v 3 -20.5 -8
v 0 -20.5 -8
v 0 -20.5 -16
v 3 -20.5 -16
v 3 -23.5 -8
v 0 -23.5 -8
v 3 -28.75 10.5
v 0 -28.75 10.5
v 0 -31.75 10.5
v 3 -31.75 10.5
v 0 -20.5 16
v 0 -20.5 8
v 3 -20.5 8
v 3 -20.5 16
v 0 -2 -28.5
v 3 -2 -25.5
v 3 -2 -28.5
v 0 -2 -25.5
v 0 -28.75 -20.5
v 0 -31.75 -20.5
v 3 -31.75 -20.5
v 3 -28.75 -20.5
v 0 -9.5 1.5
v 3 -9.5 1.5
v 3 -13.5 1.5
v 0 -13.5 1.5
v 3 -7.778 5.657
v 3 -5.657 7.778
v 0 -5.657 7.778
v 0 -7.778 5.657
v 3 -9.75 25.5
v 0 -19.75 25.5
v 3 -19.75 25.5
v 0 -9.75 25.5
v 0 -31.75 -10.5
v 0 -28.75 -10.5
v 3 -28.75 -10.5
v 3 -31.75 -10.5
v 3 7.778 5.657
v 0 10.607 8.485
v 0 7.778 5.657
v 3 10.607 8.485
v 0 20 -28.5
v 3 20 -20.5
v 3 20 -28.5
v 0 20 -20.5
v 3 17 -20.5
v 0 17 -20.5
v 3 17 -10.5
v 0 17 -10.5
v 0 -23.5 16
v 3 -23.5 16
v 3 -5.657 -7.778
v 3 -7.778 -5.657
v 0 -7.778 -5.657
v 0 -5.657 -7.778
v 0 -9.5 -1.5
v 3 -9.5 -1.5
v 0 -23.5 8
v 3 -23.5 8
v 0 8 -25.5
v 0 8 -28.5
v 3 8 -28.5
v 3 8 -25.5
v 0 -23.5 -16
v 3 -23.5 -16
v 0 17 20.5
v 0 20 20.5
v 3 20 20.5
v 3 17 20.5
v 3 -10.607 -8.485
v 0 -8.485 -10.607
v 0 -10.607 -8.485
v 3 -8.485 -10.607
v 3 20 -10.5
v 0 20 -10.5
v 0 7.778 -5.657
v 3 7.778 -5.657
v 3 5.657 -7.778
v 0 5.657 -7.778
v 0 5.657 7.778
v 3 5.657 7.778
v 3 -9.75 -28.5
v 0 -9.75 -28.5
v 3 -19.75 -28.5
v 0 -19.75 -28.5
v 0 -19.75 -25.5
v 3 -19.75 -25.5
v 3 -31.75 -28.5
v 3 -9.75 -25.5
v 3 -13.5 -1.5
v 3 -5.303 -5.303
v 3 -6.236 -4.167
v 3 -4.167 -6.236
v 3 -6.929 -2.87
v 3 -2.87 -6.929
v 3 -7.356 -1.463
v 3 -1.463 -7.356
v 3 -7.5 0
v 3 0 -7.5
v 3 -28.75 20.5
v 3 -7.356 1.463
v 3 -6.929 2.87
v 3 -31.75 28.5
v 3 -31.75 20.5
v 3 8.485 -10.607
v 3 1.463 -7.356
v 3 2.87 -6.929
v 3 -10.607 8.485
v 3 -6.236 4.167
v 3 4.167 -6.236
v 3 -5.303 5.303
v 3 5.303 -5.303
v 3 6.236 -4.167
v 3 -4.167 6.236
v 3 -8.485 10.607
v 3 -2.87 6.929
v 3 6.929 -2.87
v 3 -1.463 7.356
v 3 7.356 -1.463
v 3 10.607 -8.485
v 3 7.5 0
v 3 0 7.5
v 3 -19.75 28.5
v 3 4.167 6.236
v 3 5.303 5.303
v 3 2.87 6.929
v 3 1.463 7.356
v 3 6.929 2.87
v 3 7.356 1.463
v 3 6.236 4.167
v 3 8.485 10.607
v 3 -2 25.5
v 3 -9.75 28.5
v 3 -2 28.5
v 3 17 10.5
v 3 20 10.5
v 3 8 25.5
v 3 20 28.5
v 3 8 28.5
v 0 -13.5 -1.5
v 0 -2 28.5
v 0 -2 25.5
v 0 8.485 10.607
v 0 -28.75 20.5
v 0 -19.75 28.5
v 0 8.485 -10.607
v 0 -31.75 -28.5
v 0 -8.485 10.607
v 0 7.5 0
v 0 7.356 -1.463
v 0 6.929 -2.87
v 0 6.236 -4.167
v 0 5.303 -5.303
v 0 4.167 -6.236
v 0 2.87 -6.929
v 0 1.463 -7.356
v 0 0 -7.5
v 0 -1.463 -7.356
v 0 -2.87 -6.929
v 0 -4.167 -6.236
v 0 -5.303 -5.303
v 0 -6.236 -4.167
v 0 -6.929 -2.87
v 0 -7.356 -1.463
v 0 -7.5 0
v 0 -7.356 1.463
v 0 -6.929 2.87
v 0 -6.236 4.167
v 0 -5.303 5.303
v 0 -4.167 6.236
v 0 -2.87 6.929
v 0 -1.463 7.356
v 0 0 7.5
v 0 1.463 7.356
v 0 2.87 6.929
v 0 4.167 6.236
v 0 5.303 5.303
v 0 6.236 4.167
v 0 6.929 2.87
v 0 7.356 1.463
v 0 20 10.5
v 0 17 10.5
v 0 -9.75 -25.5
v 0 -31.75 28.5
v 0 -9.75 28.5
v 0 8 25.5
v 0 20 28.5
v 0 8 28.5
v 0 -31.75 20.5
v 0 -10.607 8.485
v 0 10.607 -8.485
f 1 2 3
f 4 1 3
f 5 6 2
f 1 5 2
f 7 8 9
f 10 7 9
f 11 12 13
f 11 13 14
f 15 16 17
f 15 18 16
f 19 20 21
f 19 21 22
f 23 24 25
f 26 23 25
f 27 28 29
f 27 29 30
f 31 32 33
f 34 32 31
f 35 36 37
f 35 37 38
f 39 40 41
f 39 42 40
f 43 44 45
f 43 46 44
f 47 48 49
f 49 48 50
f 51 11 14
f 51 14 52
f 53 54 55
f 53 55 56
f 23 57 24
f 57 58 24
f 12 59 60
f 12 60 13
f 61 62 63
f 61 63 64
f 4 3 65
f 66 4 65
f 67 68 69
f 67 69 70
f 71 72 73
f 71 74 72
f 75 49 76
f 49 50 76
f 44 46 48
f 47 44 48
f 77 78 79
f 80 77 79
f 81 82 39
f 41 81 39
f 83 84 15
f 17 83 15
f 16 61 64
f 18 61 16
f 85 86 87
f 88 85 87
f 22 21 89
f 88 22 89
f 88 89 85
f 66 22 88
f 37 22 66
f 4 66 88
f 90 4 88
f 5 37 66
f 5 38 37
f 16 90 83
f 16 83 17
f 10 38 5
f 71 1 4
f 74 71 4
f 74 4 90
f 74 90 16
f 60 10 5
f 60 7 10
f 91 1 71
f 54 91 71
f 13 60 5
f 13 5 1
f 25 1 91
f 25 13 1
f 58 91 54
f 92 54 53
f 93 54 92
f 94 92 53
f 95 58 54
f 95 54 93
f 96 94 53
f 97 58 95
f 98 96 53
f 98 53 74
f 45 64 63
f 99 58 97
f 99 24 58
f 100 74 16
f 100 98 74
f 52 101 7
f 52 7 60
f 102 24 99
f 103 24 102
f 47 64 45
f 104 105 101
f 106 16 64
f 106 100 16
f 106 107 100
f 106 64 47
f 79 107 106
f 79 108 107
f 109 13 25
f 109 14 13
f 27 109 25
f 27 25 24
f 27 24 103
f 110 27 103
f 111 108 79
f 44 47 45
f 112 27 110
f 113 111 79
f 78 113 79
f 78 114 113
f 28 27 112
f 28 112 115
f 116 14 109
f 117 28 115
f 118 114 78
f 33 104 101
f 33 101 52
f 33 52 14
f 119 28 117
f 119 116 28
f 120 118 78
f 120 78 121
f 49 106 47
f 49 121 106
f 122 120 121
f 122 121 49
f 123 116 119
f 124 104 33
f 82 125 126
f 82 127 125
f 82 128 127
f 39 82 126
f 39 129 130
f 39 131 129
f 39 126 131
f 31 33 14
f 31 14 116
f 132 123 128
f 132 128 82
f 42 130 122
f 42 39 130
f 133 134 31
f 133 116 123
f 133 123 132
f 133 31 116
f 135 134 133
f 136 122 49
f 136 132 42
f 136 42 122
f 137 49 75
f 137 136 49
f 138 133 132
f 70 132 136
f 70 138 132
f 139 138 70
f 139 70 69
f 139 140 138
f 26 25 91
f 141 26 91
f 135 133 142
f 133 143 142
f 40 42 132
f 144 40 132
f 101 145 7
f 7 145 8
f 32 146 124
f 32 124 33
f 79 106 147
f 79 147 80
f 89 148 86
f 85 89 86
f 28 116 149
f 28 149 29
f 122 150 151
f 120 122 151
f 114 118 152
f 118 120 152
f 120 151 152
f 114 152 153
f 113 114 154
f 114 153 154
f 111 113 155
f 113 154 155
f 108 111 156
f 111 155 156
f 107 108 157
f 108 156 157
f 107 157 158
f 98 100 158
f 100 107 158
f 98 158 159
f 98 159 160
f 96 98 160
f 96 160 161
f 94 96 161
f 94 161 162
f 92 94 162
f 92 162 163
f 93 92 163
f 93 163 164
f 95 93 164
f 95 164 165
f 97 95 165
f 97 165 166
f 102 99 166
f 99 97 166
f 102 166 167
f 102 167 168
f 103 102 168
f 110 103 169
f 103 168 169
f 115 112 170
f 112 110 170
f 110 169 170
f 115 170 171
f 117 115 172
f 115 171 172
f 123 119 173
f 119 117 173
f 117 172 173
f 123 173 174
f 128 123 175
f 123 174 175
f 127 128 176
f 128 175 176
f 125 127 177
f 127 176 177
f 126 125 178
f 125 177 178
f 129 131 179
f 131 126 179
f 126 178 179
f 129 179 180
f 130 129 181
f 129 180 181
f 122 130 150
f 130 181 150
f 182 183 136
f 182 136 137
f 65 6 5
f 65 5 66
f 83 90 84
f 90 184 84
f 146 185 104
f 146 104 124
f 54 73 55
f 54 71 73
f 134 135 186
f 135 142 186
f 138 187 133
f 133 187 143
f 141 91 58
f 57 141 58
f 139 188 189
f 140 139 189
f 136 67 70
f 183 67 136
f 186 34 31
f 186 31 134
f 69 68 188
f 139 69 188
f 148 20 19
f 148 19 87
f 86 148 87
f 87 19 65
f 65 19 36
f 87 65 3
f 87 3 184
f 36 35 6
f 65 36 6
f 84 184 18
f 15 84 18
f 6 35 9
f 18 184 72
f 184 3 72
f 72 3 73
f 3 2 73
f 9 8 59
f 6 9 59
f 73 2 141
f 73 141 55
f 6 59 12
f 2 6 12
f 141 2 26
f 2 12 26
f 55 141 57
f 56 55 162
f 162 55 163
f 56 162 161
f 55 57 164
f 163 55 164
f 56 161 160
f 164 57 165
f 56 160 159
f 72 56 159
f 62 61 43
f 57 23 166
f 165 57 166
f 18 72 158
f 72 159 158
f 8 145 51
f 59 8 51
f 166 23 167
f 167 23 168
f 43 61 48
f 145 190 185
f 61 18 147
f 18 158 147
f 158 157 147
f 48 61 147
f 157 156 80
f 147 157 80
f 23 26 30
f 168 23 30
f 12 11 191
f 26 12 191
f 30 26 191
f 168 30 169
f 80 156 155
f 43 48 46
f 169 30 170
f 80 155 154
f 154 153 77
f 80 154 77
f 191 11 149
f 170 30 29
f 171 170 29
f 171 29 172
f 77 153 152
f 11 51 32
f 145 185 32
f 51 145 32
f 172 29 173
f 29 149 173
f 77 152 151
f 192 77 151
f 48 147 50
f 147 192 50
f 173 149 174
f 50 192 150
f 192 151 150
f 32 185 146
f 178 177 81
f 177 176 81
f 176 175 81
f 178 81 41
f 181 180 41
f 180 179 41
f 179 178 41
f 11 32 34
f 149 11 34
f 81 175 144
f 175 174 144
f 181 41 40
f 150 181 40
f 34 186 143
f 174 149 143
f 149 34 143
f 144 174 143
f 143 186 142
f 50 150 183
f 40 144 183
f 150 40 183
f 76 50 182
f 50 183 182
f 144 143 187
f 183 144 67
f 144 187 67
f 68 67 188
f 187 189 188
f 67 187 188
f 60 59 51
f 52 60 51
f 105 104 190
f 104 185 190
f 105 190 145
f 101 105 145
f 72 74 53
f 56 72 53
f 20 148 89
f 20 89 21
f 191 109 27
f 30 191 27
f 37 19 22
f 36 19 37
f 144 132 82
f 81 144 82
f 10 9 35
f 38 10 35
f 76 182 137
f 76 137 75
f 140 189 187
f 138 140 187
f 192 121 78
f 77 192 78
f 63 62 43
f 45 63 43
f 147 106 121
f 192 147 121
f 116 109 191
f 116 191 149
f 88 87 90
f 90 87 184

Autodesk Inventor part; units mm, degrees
ref_plane "YZ Plane" through (0, 0, 0) normal (1, 0, 0) x (0, 1, 0)
ref_plane "XZ Plane" through (0, 0, 0) normal (0, 1, 0) x (-1, 0, 0)
ref_plane "XY Plane" through (0, 0, 0) normal (0, 0, 1) x (1, 0, 0)
sketch "Sketch1" plane through (0, 0, 0) normal (1, 0, 0) x (0, 1, 0)
  circle A0 centre (0, 0) radius 7.5
  line L0 (-31.75, -25.5) -> (-31.75, -20.5)
  line L1 (-31.75, -20.5) -> (-28.75, -20.5)
  line L2 (-28.75, -20.5) -> (-28.75, -10.5)
  line L3 (-28.75, -10.5) -> (-31.75, -10.5)
  line L4 (0, 0) -> (-31.75, 0) construction
  line L5 (-31.75, 20.5) -> (-28.75, 20.5)
  line L6 (-28.75, 20.5) -> (-28.75, 10.5)
  line L7 (-28.75, 10.5) -> (-31.75, 10.5)
  line L8 (-31.75, 25.5) -> (-31.75, 20.5)
  line L9 (-31.75, 10.5) -> (-31.75, -10.5)
  line L10 (-31.75, -20.5) -> (-31.75, -25.5)
  line L11 (20, 25.5) -> (20, 20.5)
  line L12 (20, 20.5) -> (17, 20.5)
  line L13 (17, 20.5) -> (17, 10.5)
  line L14 (17, 10.5) -> (20, 10.5)
  line L15 (20, -20.5) -> (17, -20.5)
  line L16 (17, -20.5) -> (17, -10.5)
  line L17 (17, -10.5) -> (20, -10.5)
  line L18 (20, 25.5) -> (20, 20.5)
  line L19 (20, 10.5) -> (20, -10.5)
  line L20 (20, -20.5) -> (20, -25.5)
  line L21 (20, 25.5) -> (20, 28.5)
  line L22 (-31.75, 28.5) -> (-31.75, 25.5)
  line L23 (-31.75, -25.5) -> (-31.75, -28.5)
  line L24 (20, -28.5) -> (20, -25.5)
  line L25 (-31.75, 28.5) -> (-19.75, 28.5)
  line L26 (-19.75, 28.5) -> (-19.75, 25.5)
  line L27 (-19.75, 25.5) -> (-9.75, 25.5)
  line L28 (-9.75, 25.5) -> (-9.75, 28.5)
  line L29 (-5.875, -28.5) -> (-5.875, 0) construction
  line L30 (8, 28.5) -> (8, 25.5)
  line L31 (8, 25.5) -> (-2, 25.5)
  line L32 (-2, 25.5) -> (-2, 28.5)
  line L33 (-19.75, -28.5) -> (-19.75, -25.5)
  line L34 (-19.75, -25.5) -> (-9.75, -25.5)
  line L35 (-9.75, -25.5) -> (-9.75, -28.5)
  line L36 (8, -25.5) -> (-2, -25.5)
  line L37 (8, -28.5) -> (8, -25.5)
  line L38 (-2, -25.5) -> (-2, -28.5)
  line L39 (-19.75, 28.5) -> (-31.75, 28.5)
  line L40 (20, 28.5) -> (8, 28.5)
  line L41 (-2, 28.5) -> (-9.75, 28.5)
  line L42 (-31.75, -28.5) -> (-19.75, -28.5)
  line L43 (-9.75, -28.5) -> (-2, -28.5)
  line L44 (8, -28.5) -> (20, -28.5)
  line L45 (-31.75, -28.5) -> (-19.75, -28.5)
  line L46 (-9.75, -28.5) -> (-5.875, -28.5)
  line L47 (-28.75, 20.5) -> (-23.5, 20.5) construction
  line L48 (-23.5, 20.5) -> (-23.5, -28.5) construction
  line L49 (-23.5, 0) -> (-23.5, -8) construction
  line L50 (-23.5, -8) -> (-20.5, -8)
  line L51 (-20.5, -8) -> (-20.5, -16)
  line L52 (-20.5, -16) -> (-23.5, -16)
  line L53 (-23.5, -8) -> (-23.5, -16)
  line L54 (-23.5, -20.5) -> (-23.5, 28.5) construction
  line L55 (-23.5, 0) -> (-23.5, 8) construction
  line L56 (-23.5, 8) -> (-20.5, 8)
  line L57 (-20.5, 8) -> (-20.5, 16)
  line L58 (-20.5, 16) -> (-23.5, 16)
  line L59 (-23.5, 8) -> (-23.5, 16)
  line L60 (0, -7.5) -> (0, -9.5) construction
  line L61 (0, -9.5) -> (1.5, -9.5)
  line L62 (1.5, -9.5) -> (1.5, -13.5)
  line L63 (1.5, -13.5) -> (-1.5, -13.5)
  line L64 (-1.5, -13.5) -> (-1.5, -9.5)
  line L65 (-1.5, -9.5) -> (0, -9.5)
  line L66 (0, 9.5) -> (1.5, 9.5)
  line L67 (1.5, 9.5) -> (1.5, 13.5)
  line L68 (1.5, 13.5) -> (-1.5, 13.5)
  line L69 (-1.5, 13.5) -> (-1.5, 9.5)
  line L70 (-1.5, 9.5) -> (0, 9.5)
  line L71 (7.5, 0) -> (9.5, 0) construction
  line L72 (9.5, 0) -> (9.5, -1.5)
  line L73 (9.5, -1.5) -> (13.5, -1.5)
  line L74 (13.5, -1.5) -> (13.5, 1.5)
  line L75 (13.5, 1.5) -> (9.5, 1.5)
  line L76 (9.5, 1.5) -> (9.5, 0)
  line L77 (-7.5, 0) -> (-9.5, 0) construction
  line L78 (-9.5, 0) -> (-9.5, -1.5)
  line L79 (-9.5, -1.5) -> (-13.5, -1.5)
  line L80 (-13.5, -1.5) -> (-13.5, 1.5)
  line L81 (-13.5, 1.5) -> (-9.5, 1.5)
  line L82 (-9.5, 1.5) -> (-9.5, 0)
  dimension "d0" = 15
  dimension "d3" = 51
  dimension "d7" = 5
  dimension "d8" = 3
  dimension "d9" = 10
  dimension "d10" = 3
  dimension "d11" = 51.75
  dimension "d12" = 3
  dimension "d13" = 3
  dimension "d14" = 12
  dimension "d15" = 3
  dimension "d16" = 10
  dimension "d17" = 25.875
  dimension "d18" = 5.25
  dimension "d19" = 8
  dimension "d20" = 3
  dimension "d21" = 8
  dimension "d22" = 2
  dimension "d23" = 1.5
  dimension "d24" = 4
  dimension "d25" = 3
  dimension "d26" = 2
  dimension "d27" = 1.5
  dimension "d28" = 4
  dimension "d29" = 3
extrude "Extrusion1" add sketch "Sketch1" along normal blind 3
sketch "Sketch4" plane through (3, 0, 0) normal (1, 0, 0) x (0, 0, -1)
  line L0 (1.5, 9.5) -> (-1.5, 9.5) projected
  line L1 (-1.5, 9.5) -> (1.5, 9.5)
  line L2 (1.5, 13.5) -> (1.5, 9.5) projected
  line L3 (1.5, 9.5) -> (1.5, 13.5)
  line L4 (-1.5, 13.5) -> (1.5, 13.5) projected
  line L5 (1.5, 13.5) -> (-1.5, 13.5)
  line L6 (-1.5, 9.5) -> (-1.5, 13.5) projected
  line L7 (-1.5, 13.5) -> (-1.5, 9.5)
  line L8 (-1.5, -9.5) -> (1.5, -9.5) projected
  line L9 (-1.5, -9.5) -> (1.5, -9.5)
  line L10 (1.5, -9.5) -> (1.5, -13.5) projected
  line L11 (1.5, -9.5) -> (1.5, -13.5)
  line L12 (1.5, -13.5) -> (-1.5, -13.5) projected
  line L13 (1.5, -13.5) -> (-1.5, -13.5)
  line L14 (-1.5, -13.5) -> (-1.5, -9.5) projected
  line L15 (-1.5, -13.5) -> (-1.5, -9.5)
  point P0 (0, 0)
extrude "Extrusion3" add sketch "Sketch4" against normal up to surface (3 mm away)
sketch "Sketch5" plane through (3, 0, 0) normal (1, 0, 0) x (0, 0, -1)
  line L0 (-9.5, -1.5) -> (-13.5, -1.5) projected
  line L1 (-13.5, -1.5) -> (-13.5, 1.5) projected
  line L2 (-13.5, 1.5) -> (-9.5, 1.5) projected
  line L3 (-9.5, 1.5) -> (-9.5, -1.5) projected
  line L4 (-9.5, -1.5) -> (-13.5, -1.5) projected
  line L5 (-13.5, -1.5) -> (-13.5, 1.5) projected
  line L6 (-13.5, -1.5) -> (-13.5, 1.5)
  line L7 (-13.5, 1.5) -> (-9.5, 1.5) projected
  line L8 (-13.5, 1.5) -> (-9.5, 1.5)
  line L9 (-9.5, 1.5) -> (-9.5, -1.5)
  line L10 (-13.5, -1.5) -> (-9.5, -1.5)
  line L11 (0, 0) -> (0, 8.8912) construction
  line L12 (-8.4853, -10.6066) -> (-10.6066, -8.4853)
  line L13 (-10.6066, -8.4853) -> (-7.7782, -5.6569)
  line L14 (-7.7782, -5.6569) -> (-5.6569, -7.7782)
  line L15 (-8.4853, -10.6066) -> (-5.6569, -7.7782)
  line L16 (8.4853, -10.6066) -> (5.6569, -7.7782)
  line L17 (10.6066, -8.4853) -> (8.4853, -10.6066)
  line L18 (10.6066, -8.4853) -> (7.7782, -5.6569)
  line L19 (5.6569, -7.7782) -> (7.7782, -5.6569)
  line L20 (0, 0) -> (-7.7782, 0) construction
  line L21 (-10.6066, 8.4853) -> (-7.7782, 5.6569)
  line L22 (-8.4853, 10.6066) -> (-10.6066, 8.4853)
  line L23 (-8.4853, 10.6066) -> (-5.6569, 7.7782)
  line L24 (-7.7782, 5.6569) -> (-5.6569, 7.7782)
  line L25 (10.6066, 8.4853) -> (7.7782, 5.6569)
  line L26 (5.6569, 7.7782) -> (7.7782, 5.6569)
  line L27 (8.4853, 10.6066) -> (5.6569, 7.7782)
  line L28 (10.6066, 8.4853) -> (8.4853, 10.6066)
extrude "Extrusion4" cut sketch "Sketch5" against normal up to surface (3 mm away) contours L12 L13 L14 L15 | L16 L19 L18 L17 | L22 L23 L24 L21 | L25 L26 L27 L28
ref_plane "Work Plane1" through (-17.5, 0, 0) normal (1, 0, 0) x (0, 0, -1)
sketch "Sketch6" plane through (-17.5, 0, 0) normal (1, 0, 0) x (0, 0, -1)
  line L0 (8.4853, -10.6066) -> (5.6569, -7.7782) projected
  line L1 (5.6569, -7.7782) -> (7.7782, -5.6569) projected
  line L2 (7.7782, -5.6569) -> (10.6066, -8.4853) projected
  line L3 (10.6066, -8.4853) -> (8.4853, -10.6066) projected
  line L4 (-5.6569, 7.7782) -> (-7.7782, 5.6569) projected
  line L5 (-7.7782, 5.6569) -> (-10.6066, 8.4853) projected
  line L6 (-10.6066, 8.4853) -> (-8.4853, 10.6066) projected
  line L7 (-8.4853, 10.6066) -> (-5.6569, 7.7782) projected
  line L8 (10.6066, 8.4853) -> (7.7782, 5.6569) projected
  line L9 (7.7782, 5.6569) -> (5.6569, 7.7782) projected
  line L10 (5.6569, 7.7782) -> (8.4853, 10.6066) projected
  line L11 (8.4853, 10.6066) -> (10.6066, 8.4853) projected
  line L12 (-7.7782, -5.6569) -> (-5.6569, -7.7782) projected
  line L13 (-5.6569, -7.7782) -> (-8.4853, -10.6066) projected
  line L14 (-8.4853, -10.6066) -> (-10.6066, -8.4853) projected
  line L15 (-10.6066, -8.4853) -> (-7.7782, -5.6569) projected
  line L16 (-25.5, -2) -> (-28.5, -2) projected
  line L17 (-28.5, -2) -> (-28.5, -9.75) projected
  line L18 (-28.5, -9.75) -> (-25.5, -9.75) projected
  line L19 (-25.5, -9.75) -> (-25.5, -19.75) projected
  line L20 (-25.5, -19.75) -> (-28.5, -19.75) projected
  line L21 (-28.5, -19.75) -> (-28.5, -31.75) projected
  line L22 (-28.5, -31.75) -> (-20.5, -31.75) projected
  line L23 (-20.5, -31.75) -> (-20.5, -28.75) projected
  line L24 (-20.5, -28.75) -> (-10.5, -28.75) projected
  line L25 (-10.5, -28.75) -> (-10.5, -31.75) projected
  line L26 (-10.5, -31.75) -> (10.5, -31.75) projected
  line L27 (10.5, -31.75) -> (10.5, -28.75) projected
  line L28 (10.5, -28.75) -> (20.5, -28.75) projected
  line L29 (20.5, -28.75) -> (20.5, -31.75) projected
  line L30 (20.5, -31.75) -> (28.5, -31.75) projected
  line L31 (28.5, -31.75) -> (28.5, -19.75) projected
  line L32 (28.5, -19.75) -> (25.5, -19.75) projected
  line L33 (25.5, -19.75) -> (25.5, -9.75) projected
  line L34 (25.5, -9.75) -> (28.5, -9.75) projected
  line L35 (28.5, -9.75) -> (28.5, -2) projected
  line L36 (28.5, -2) -> (25.5, -2) projected
  line L37 (25.5, -2) -> (25.5, 8) projected
  line L38 (25.5, 8) -> (28.5, 8) projected
  line L39 (28.5, 8) -> (28.5, 20) projected
  line L40 (28.5, 20) -> (20.5, 20) projected
  line L41 (20.5, 20) -> (20.5, 17) projected
  line L42 (20.5, 17) -> (10.5, 17) projected
  line L43 (10.5, 17) -> (10.5, 20) projected
  line L44 (10.5, 20) -> (-10.5, 20) projected
  line L45 (-10.5, 20) -> (-10.5, 17) projected
  line L46 (-10.5, 17) -> (-20.5, 17) projected
  line L47 (-20.5, 17) -> (-20.5, 20) projected
  line L48 (-20.5, 20) -> (-28.5, 20) projected
  line L49 (-28.5, 20) -> (-28.5, 8) projected
  line L50 (-28.5, 8) -> (-25.5, 8) projected
  line L51 (-25.5, 8) -> (-25.5, -2) projected
  circle A0 centre (0, 0) radius 7.5 projected
  line L52 (16, -20.5) -> (16, -23.5) projected
  line L53 (16, -23.5) -> (8, -23.5) projected
  line L54 (8, -23.5) -> (8, -20.5) projected
  line L55 (8, -20.5) -> (16, -20.5) projected
  line L56 (-8, -23.5) -> (-16, -23.5) projected
  line L57 (-16, -23.5) -> (-16, -20.5) projected
  line L58 (-16, -20.5) -> (-8, -20.5) projected
  line L59 (-8, -20.5) -> (-8, -23.5) projected
  line L60 (13.5, 1.5) -> (13.5, -1.5) projected
  line L61 (13.5, -1.5) -> (9.5, -1.5) projected
  line L62 (9.5, -1.5) -> (9.5, 1.5) projected
  line L63 (9.5, 1.5) -> (13.5, 1.5) projected
  line L64 (-9.5, 1.5) -> (-9.5, -1.5) projected
  line L65 (-9.5, -1.5) -> (-13.5, -1.5) projected
  line L66 (-13.5, -1.5) -> (-13.5, 1.5) projected
  line L67 (-13.5, 1.5) -> (-9.5, 1.5) projected
  circle A1 centre (0, 0) radius 14.5
  dimension "d40" = 29
sketch "Sketch7" plane through (3, 0, 0) normal (1, 0, 0) x (0, 0, -1)
  line L0 (-13.5, -1.5) -> (-13.5, 1.5) projected
  line L1 (-9.5, 1.5) -> (-9.5, -1.5) projected
  line L2 (-13.5, -1.5) -> (-9.5, -1.5)
  line L3 (-9.5, -1.5) -> (-9.5, 1.5)
  line L4 (-9.5, 1.5) -> (-13.5, 1.5)
  line L5 (-13.5, 1.5) -> (-13.5, -1.5)
  line L6 (13.5, -1.5) -> (9.5, -1.5) projected
  line L7 (13.5, 1.5) -> (13.5, -1.5) projected
  line L8 (9.5, -1.5) -> (13.5, -1.5)
  line L9 (13.5, -1.5) -> (13.5, 1.5)
  line L10 (13.5, 1.5) -> (9.5, 1.5)
  line L11 (9.5, 1.5) -> (9.5, -1.5)
  point P0 (0, 0)
extrude "Extrusion5" add sketch "Sketch7" against normal up to surface (3 mm away)
sketch "Sketch8" plane through (3, 0, 0) normal (1, 0, 0) x (0, 0, -1)
  line L0 (-8.4853, -10.6066) -> (-5.6569, -7.7782) projected
  line L1 (-8.4853, -10.6066) -> (-5.6569, -7.7782)
  line L2 (-5.6569, -7.7782) -> (-7.7782, -5.6569) projected
  line L3 (-5.6569, -7.7782) -> (-7.7782, -5.6569)
  line L4 (-7.7782, -5.6569) -> (-10.6066, -8.4853)
  line L5 (-10.6066, -8.4853) -> (-8.4853, -10.6066) projected
  line L6 (-10.6066, -8.4853) -> (-8.4853, -10.6066)
  line L7 (1.5, -13.5) -> (1.5, -9.5)
  line L8 (1.5, -9.5) -> (-1.5, -9.5)
  line L9 (-1.5, -9.5) -> (-1.5, -13.5)
  line L10 (-1.5, -13.5) -> (1.5, -13.5)
  point P0 (0, 0)
extrude "Extrusion6" cut sketch "Sketch8" against normal up to surface (3 mm away) contours L10 L9 L8 L7
properties part number "Frontal"
